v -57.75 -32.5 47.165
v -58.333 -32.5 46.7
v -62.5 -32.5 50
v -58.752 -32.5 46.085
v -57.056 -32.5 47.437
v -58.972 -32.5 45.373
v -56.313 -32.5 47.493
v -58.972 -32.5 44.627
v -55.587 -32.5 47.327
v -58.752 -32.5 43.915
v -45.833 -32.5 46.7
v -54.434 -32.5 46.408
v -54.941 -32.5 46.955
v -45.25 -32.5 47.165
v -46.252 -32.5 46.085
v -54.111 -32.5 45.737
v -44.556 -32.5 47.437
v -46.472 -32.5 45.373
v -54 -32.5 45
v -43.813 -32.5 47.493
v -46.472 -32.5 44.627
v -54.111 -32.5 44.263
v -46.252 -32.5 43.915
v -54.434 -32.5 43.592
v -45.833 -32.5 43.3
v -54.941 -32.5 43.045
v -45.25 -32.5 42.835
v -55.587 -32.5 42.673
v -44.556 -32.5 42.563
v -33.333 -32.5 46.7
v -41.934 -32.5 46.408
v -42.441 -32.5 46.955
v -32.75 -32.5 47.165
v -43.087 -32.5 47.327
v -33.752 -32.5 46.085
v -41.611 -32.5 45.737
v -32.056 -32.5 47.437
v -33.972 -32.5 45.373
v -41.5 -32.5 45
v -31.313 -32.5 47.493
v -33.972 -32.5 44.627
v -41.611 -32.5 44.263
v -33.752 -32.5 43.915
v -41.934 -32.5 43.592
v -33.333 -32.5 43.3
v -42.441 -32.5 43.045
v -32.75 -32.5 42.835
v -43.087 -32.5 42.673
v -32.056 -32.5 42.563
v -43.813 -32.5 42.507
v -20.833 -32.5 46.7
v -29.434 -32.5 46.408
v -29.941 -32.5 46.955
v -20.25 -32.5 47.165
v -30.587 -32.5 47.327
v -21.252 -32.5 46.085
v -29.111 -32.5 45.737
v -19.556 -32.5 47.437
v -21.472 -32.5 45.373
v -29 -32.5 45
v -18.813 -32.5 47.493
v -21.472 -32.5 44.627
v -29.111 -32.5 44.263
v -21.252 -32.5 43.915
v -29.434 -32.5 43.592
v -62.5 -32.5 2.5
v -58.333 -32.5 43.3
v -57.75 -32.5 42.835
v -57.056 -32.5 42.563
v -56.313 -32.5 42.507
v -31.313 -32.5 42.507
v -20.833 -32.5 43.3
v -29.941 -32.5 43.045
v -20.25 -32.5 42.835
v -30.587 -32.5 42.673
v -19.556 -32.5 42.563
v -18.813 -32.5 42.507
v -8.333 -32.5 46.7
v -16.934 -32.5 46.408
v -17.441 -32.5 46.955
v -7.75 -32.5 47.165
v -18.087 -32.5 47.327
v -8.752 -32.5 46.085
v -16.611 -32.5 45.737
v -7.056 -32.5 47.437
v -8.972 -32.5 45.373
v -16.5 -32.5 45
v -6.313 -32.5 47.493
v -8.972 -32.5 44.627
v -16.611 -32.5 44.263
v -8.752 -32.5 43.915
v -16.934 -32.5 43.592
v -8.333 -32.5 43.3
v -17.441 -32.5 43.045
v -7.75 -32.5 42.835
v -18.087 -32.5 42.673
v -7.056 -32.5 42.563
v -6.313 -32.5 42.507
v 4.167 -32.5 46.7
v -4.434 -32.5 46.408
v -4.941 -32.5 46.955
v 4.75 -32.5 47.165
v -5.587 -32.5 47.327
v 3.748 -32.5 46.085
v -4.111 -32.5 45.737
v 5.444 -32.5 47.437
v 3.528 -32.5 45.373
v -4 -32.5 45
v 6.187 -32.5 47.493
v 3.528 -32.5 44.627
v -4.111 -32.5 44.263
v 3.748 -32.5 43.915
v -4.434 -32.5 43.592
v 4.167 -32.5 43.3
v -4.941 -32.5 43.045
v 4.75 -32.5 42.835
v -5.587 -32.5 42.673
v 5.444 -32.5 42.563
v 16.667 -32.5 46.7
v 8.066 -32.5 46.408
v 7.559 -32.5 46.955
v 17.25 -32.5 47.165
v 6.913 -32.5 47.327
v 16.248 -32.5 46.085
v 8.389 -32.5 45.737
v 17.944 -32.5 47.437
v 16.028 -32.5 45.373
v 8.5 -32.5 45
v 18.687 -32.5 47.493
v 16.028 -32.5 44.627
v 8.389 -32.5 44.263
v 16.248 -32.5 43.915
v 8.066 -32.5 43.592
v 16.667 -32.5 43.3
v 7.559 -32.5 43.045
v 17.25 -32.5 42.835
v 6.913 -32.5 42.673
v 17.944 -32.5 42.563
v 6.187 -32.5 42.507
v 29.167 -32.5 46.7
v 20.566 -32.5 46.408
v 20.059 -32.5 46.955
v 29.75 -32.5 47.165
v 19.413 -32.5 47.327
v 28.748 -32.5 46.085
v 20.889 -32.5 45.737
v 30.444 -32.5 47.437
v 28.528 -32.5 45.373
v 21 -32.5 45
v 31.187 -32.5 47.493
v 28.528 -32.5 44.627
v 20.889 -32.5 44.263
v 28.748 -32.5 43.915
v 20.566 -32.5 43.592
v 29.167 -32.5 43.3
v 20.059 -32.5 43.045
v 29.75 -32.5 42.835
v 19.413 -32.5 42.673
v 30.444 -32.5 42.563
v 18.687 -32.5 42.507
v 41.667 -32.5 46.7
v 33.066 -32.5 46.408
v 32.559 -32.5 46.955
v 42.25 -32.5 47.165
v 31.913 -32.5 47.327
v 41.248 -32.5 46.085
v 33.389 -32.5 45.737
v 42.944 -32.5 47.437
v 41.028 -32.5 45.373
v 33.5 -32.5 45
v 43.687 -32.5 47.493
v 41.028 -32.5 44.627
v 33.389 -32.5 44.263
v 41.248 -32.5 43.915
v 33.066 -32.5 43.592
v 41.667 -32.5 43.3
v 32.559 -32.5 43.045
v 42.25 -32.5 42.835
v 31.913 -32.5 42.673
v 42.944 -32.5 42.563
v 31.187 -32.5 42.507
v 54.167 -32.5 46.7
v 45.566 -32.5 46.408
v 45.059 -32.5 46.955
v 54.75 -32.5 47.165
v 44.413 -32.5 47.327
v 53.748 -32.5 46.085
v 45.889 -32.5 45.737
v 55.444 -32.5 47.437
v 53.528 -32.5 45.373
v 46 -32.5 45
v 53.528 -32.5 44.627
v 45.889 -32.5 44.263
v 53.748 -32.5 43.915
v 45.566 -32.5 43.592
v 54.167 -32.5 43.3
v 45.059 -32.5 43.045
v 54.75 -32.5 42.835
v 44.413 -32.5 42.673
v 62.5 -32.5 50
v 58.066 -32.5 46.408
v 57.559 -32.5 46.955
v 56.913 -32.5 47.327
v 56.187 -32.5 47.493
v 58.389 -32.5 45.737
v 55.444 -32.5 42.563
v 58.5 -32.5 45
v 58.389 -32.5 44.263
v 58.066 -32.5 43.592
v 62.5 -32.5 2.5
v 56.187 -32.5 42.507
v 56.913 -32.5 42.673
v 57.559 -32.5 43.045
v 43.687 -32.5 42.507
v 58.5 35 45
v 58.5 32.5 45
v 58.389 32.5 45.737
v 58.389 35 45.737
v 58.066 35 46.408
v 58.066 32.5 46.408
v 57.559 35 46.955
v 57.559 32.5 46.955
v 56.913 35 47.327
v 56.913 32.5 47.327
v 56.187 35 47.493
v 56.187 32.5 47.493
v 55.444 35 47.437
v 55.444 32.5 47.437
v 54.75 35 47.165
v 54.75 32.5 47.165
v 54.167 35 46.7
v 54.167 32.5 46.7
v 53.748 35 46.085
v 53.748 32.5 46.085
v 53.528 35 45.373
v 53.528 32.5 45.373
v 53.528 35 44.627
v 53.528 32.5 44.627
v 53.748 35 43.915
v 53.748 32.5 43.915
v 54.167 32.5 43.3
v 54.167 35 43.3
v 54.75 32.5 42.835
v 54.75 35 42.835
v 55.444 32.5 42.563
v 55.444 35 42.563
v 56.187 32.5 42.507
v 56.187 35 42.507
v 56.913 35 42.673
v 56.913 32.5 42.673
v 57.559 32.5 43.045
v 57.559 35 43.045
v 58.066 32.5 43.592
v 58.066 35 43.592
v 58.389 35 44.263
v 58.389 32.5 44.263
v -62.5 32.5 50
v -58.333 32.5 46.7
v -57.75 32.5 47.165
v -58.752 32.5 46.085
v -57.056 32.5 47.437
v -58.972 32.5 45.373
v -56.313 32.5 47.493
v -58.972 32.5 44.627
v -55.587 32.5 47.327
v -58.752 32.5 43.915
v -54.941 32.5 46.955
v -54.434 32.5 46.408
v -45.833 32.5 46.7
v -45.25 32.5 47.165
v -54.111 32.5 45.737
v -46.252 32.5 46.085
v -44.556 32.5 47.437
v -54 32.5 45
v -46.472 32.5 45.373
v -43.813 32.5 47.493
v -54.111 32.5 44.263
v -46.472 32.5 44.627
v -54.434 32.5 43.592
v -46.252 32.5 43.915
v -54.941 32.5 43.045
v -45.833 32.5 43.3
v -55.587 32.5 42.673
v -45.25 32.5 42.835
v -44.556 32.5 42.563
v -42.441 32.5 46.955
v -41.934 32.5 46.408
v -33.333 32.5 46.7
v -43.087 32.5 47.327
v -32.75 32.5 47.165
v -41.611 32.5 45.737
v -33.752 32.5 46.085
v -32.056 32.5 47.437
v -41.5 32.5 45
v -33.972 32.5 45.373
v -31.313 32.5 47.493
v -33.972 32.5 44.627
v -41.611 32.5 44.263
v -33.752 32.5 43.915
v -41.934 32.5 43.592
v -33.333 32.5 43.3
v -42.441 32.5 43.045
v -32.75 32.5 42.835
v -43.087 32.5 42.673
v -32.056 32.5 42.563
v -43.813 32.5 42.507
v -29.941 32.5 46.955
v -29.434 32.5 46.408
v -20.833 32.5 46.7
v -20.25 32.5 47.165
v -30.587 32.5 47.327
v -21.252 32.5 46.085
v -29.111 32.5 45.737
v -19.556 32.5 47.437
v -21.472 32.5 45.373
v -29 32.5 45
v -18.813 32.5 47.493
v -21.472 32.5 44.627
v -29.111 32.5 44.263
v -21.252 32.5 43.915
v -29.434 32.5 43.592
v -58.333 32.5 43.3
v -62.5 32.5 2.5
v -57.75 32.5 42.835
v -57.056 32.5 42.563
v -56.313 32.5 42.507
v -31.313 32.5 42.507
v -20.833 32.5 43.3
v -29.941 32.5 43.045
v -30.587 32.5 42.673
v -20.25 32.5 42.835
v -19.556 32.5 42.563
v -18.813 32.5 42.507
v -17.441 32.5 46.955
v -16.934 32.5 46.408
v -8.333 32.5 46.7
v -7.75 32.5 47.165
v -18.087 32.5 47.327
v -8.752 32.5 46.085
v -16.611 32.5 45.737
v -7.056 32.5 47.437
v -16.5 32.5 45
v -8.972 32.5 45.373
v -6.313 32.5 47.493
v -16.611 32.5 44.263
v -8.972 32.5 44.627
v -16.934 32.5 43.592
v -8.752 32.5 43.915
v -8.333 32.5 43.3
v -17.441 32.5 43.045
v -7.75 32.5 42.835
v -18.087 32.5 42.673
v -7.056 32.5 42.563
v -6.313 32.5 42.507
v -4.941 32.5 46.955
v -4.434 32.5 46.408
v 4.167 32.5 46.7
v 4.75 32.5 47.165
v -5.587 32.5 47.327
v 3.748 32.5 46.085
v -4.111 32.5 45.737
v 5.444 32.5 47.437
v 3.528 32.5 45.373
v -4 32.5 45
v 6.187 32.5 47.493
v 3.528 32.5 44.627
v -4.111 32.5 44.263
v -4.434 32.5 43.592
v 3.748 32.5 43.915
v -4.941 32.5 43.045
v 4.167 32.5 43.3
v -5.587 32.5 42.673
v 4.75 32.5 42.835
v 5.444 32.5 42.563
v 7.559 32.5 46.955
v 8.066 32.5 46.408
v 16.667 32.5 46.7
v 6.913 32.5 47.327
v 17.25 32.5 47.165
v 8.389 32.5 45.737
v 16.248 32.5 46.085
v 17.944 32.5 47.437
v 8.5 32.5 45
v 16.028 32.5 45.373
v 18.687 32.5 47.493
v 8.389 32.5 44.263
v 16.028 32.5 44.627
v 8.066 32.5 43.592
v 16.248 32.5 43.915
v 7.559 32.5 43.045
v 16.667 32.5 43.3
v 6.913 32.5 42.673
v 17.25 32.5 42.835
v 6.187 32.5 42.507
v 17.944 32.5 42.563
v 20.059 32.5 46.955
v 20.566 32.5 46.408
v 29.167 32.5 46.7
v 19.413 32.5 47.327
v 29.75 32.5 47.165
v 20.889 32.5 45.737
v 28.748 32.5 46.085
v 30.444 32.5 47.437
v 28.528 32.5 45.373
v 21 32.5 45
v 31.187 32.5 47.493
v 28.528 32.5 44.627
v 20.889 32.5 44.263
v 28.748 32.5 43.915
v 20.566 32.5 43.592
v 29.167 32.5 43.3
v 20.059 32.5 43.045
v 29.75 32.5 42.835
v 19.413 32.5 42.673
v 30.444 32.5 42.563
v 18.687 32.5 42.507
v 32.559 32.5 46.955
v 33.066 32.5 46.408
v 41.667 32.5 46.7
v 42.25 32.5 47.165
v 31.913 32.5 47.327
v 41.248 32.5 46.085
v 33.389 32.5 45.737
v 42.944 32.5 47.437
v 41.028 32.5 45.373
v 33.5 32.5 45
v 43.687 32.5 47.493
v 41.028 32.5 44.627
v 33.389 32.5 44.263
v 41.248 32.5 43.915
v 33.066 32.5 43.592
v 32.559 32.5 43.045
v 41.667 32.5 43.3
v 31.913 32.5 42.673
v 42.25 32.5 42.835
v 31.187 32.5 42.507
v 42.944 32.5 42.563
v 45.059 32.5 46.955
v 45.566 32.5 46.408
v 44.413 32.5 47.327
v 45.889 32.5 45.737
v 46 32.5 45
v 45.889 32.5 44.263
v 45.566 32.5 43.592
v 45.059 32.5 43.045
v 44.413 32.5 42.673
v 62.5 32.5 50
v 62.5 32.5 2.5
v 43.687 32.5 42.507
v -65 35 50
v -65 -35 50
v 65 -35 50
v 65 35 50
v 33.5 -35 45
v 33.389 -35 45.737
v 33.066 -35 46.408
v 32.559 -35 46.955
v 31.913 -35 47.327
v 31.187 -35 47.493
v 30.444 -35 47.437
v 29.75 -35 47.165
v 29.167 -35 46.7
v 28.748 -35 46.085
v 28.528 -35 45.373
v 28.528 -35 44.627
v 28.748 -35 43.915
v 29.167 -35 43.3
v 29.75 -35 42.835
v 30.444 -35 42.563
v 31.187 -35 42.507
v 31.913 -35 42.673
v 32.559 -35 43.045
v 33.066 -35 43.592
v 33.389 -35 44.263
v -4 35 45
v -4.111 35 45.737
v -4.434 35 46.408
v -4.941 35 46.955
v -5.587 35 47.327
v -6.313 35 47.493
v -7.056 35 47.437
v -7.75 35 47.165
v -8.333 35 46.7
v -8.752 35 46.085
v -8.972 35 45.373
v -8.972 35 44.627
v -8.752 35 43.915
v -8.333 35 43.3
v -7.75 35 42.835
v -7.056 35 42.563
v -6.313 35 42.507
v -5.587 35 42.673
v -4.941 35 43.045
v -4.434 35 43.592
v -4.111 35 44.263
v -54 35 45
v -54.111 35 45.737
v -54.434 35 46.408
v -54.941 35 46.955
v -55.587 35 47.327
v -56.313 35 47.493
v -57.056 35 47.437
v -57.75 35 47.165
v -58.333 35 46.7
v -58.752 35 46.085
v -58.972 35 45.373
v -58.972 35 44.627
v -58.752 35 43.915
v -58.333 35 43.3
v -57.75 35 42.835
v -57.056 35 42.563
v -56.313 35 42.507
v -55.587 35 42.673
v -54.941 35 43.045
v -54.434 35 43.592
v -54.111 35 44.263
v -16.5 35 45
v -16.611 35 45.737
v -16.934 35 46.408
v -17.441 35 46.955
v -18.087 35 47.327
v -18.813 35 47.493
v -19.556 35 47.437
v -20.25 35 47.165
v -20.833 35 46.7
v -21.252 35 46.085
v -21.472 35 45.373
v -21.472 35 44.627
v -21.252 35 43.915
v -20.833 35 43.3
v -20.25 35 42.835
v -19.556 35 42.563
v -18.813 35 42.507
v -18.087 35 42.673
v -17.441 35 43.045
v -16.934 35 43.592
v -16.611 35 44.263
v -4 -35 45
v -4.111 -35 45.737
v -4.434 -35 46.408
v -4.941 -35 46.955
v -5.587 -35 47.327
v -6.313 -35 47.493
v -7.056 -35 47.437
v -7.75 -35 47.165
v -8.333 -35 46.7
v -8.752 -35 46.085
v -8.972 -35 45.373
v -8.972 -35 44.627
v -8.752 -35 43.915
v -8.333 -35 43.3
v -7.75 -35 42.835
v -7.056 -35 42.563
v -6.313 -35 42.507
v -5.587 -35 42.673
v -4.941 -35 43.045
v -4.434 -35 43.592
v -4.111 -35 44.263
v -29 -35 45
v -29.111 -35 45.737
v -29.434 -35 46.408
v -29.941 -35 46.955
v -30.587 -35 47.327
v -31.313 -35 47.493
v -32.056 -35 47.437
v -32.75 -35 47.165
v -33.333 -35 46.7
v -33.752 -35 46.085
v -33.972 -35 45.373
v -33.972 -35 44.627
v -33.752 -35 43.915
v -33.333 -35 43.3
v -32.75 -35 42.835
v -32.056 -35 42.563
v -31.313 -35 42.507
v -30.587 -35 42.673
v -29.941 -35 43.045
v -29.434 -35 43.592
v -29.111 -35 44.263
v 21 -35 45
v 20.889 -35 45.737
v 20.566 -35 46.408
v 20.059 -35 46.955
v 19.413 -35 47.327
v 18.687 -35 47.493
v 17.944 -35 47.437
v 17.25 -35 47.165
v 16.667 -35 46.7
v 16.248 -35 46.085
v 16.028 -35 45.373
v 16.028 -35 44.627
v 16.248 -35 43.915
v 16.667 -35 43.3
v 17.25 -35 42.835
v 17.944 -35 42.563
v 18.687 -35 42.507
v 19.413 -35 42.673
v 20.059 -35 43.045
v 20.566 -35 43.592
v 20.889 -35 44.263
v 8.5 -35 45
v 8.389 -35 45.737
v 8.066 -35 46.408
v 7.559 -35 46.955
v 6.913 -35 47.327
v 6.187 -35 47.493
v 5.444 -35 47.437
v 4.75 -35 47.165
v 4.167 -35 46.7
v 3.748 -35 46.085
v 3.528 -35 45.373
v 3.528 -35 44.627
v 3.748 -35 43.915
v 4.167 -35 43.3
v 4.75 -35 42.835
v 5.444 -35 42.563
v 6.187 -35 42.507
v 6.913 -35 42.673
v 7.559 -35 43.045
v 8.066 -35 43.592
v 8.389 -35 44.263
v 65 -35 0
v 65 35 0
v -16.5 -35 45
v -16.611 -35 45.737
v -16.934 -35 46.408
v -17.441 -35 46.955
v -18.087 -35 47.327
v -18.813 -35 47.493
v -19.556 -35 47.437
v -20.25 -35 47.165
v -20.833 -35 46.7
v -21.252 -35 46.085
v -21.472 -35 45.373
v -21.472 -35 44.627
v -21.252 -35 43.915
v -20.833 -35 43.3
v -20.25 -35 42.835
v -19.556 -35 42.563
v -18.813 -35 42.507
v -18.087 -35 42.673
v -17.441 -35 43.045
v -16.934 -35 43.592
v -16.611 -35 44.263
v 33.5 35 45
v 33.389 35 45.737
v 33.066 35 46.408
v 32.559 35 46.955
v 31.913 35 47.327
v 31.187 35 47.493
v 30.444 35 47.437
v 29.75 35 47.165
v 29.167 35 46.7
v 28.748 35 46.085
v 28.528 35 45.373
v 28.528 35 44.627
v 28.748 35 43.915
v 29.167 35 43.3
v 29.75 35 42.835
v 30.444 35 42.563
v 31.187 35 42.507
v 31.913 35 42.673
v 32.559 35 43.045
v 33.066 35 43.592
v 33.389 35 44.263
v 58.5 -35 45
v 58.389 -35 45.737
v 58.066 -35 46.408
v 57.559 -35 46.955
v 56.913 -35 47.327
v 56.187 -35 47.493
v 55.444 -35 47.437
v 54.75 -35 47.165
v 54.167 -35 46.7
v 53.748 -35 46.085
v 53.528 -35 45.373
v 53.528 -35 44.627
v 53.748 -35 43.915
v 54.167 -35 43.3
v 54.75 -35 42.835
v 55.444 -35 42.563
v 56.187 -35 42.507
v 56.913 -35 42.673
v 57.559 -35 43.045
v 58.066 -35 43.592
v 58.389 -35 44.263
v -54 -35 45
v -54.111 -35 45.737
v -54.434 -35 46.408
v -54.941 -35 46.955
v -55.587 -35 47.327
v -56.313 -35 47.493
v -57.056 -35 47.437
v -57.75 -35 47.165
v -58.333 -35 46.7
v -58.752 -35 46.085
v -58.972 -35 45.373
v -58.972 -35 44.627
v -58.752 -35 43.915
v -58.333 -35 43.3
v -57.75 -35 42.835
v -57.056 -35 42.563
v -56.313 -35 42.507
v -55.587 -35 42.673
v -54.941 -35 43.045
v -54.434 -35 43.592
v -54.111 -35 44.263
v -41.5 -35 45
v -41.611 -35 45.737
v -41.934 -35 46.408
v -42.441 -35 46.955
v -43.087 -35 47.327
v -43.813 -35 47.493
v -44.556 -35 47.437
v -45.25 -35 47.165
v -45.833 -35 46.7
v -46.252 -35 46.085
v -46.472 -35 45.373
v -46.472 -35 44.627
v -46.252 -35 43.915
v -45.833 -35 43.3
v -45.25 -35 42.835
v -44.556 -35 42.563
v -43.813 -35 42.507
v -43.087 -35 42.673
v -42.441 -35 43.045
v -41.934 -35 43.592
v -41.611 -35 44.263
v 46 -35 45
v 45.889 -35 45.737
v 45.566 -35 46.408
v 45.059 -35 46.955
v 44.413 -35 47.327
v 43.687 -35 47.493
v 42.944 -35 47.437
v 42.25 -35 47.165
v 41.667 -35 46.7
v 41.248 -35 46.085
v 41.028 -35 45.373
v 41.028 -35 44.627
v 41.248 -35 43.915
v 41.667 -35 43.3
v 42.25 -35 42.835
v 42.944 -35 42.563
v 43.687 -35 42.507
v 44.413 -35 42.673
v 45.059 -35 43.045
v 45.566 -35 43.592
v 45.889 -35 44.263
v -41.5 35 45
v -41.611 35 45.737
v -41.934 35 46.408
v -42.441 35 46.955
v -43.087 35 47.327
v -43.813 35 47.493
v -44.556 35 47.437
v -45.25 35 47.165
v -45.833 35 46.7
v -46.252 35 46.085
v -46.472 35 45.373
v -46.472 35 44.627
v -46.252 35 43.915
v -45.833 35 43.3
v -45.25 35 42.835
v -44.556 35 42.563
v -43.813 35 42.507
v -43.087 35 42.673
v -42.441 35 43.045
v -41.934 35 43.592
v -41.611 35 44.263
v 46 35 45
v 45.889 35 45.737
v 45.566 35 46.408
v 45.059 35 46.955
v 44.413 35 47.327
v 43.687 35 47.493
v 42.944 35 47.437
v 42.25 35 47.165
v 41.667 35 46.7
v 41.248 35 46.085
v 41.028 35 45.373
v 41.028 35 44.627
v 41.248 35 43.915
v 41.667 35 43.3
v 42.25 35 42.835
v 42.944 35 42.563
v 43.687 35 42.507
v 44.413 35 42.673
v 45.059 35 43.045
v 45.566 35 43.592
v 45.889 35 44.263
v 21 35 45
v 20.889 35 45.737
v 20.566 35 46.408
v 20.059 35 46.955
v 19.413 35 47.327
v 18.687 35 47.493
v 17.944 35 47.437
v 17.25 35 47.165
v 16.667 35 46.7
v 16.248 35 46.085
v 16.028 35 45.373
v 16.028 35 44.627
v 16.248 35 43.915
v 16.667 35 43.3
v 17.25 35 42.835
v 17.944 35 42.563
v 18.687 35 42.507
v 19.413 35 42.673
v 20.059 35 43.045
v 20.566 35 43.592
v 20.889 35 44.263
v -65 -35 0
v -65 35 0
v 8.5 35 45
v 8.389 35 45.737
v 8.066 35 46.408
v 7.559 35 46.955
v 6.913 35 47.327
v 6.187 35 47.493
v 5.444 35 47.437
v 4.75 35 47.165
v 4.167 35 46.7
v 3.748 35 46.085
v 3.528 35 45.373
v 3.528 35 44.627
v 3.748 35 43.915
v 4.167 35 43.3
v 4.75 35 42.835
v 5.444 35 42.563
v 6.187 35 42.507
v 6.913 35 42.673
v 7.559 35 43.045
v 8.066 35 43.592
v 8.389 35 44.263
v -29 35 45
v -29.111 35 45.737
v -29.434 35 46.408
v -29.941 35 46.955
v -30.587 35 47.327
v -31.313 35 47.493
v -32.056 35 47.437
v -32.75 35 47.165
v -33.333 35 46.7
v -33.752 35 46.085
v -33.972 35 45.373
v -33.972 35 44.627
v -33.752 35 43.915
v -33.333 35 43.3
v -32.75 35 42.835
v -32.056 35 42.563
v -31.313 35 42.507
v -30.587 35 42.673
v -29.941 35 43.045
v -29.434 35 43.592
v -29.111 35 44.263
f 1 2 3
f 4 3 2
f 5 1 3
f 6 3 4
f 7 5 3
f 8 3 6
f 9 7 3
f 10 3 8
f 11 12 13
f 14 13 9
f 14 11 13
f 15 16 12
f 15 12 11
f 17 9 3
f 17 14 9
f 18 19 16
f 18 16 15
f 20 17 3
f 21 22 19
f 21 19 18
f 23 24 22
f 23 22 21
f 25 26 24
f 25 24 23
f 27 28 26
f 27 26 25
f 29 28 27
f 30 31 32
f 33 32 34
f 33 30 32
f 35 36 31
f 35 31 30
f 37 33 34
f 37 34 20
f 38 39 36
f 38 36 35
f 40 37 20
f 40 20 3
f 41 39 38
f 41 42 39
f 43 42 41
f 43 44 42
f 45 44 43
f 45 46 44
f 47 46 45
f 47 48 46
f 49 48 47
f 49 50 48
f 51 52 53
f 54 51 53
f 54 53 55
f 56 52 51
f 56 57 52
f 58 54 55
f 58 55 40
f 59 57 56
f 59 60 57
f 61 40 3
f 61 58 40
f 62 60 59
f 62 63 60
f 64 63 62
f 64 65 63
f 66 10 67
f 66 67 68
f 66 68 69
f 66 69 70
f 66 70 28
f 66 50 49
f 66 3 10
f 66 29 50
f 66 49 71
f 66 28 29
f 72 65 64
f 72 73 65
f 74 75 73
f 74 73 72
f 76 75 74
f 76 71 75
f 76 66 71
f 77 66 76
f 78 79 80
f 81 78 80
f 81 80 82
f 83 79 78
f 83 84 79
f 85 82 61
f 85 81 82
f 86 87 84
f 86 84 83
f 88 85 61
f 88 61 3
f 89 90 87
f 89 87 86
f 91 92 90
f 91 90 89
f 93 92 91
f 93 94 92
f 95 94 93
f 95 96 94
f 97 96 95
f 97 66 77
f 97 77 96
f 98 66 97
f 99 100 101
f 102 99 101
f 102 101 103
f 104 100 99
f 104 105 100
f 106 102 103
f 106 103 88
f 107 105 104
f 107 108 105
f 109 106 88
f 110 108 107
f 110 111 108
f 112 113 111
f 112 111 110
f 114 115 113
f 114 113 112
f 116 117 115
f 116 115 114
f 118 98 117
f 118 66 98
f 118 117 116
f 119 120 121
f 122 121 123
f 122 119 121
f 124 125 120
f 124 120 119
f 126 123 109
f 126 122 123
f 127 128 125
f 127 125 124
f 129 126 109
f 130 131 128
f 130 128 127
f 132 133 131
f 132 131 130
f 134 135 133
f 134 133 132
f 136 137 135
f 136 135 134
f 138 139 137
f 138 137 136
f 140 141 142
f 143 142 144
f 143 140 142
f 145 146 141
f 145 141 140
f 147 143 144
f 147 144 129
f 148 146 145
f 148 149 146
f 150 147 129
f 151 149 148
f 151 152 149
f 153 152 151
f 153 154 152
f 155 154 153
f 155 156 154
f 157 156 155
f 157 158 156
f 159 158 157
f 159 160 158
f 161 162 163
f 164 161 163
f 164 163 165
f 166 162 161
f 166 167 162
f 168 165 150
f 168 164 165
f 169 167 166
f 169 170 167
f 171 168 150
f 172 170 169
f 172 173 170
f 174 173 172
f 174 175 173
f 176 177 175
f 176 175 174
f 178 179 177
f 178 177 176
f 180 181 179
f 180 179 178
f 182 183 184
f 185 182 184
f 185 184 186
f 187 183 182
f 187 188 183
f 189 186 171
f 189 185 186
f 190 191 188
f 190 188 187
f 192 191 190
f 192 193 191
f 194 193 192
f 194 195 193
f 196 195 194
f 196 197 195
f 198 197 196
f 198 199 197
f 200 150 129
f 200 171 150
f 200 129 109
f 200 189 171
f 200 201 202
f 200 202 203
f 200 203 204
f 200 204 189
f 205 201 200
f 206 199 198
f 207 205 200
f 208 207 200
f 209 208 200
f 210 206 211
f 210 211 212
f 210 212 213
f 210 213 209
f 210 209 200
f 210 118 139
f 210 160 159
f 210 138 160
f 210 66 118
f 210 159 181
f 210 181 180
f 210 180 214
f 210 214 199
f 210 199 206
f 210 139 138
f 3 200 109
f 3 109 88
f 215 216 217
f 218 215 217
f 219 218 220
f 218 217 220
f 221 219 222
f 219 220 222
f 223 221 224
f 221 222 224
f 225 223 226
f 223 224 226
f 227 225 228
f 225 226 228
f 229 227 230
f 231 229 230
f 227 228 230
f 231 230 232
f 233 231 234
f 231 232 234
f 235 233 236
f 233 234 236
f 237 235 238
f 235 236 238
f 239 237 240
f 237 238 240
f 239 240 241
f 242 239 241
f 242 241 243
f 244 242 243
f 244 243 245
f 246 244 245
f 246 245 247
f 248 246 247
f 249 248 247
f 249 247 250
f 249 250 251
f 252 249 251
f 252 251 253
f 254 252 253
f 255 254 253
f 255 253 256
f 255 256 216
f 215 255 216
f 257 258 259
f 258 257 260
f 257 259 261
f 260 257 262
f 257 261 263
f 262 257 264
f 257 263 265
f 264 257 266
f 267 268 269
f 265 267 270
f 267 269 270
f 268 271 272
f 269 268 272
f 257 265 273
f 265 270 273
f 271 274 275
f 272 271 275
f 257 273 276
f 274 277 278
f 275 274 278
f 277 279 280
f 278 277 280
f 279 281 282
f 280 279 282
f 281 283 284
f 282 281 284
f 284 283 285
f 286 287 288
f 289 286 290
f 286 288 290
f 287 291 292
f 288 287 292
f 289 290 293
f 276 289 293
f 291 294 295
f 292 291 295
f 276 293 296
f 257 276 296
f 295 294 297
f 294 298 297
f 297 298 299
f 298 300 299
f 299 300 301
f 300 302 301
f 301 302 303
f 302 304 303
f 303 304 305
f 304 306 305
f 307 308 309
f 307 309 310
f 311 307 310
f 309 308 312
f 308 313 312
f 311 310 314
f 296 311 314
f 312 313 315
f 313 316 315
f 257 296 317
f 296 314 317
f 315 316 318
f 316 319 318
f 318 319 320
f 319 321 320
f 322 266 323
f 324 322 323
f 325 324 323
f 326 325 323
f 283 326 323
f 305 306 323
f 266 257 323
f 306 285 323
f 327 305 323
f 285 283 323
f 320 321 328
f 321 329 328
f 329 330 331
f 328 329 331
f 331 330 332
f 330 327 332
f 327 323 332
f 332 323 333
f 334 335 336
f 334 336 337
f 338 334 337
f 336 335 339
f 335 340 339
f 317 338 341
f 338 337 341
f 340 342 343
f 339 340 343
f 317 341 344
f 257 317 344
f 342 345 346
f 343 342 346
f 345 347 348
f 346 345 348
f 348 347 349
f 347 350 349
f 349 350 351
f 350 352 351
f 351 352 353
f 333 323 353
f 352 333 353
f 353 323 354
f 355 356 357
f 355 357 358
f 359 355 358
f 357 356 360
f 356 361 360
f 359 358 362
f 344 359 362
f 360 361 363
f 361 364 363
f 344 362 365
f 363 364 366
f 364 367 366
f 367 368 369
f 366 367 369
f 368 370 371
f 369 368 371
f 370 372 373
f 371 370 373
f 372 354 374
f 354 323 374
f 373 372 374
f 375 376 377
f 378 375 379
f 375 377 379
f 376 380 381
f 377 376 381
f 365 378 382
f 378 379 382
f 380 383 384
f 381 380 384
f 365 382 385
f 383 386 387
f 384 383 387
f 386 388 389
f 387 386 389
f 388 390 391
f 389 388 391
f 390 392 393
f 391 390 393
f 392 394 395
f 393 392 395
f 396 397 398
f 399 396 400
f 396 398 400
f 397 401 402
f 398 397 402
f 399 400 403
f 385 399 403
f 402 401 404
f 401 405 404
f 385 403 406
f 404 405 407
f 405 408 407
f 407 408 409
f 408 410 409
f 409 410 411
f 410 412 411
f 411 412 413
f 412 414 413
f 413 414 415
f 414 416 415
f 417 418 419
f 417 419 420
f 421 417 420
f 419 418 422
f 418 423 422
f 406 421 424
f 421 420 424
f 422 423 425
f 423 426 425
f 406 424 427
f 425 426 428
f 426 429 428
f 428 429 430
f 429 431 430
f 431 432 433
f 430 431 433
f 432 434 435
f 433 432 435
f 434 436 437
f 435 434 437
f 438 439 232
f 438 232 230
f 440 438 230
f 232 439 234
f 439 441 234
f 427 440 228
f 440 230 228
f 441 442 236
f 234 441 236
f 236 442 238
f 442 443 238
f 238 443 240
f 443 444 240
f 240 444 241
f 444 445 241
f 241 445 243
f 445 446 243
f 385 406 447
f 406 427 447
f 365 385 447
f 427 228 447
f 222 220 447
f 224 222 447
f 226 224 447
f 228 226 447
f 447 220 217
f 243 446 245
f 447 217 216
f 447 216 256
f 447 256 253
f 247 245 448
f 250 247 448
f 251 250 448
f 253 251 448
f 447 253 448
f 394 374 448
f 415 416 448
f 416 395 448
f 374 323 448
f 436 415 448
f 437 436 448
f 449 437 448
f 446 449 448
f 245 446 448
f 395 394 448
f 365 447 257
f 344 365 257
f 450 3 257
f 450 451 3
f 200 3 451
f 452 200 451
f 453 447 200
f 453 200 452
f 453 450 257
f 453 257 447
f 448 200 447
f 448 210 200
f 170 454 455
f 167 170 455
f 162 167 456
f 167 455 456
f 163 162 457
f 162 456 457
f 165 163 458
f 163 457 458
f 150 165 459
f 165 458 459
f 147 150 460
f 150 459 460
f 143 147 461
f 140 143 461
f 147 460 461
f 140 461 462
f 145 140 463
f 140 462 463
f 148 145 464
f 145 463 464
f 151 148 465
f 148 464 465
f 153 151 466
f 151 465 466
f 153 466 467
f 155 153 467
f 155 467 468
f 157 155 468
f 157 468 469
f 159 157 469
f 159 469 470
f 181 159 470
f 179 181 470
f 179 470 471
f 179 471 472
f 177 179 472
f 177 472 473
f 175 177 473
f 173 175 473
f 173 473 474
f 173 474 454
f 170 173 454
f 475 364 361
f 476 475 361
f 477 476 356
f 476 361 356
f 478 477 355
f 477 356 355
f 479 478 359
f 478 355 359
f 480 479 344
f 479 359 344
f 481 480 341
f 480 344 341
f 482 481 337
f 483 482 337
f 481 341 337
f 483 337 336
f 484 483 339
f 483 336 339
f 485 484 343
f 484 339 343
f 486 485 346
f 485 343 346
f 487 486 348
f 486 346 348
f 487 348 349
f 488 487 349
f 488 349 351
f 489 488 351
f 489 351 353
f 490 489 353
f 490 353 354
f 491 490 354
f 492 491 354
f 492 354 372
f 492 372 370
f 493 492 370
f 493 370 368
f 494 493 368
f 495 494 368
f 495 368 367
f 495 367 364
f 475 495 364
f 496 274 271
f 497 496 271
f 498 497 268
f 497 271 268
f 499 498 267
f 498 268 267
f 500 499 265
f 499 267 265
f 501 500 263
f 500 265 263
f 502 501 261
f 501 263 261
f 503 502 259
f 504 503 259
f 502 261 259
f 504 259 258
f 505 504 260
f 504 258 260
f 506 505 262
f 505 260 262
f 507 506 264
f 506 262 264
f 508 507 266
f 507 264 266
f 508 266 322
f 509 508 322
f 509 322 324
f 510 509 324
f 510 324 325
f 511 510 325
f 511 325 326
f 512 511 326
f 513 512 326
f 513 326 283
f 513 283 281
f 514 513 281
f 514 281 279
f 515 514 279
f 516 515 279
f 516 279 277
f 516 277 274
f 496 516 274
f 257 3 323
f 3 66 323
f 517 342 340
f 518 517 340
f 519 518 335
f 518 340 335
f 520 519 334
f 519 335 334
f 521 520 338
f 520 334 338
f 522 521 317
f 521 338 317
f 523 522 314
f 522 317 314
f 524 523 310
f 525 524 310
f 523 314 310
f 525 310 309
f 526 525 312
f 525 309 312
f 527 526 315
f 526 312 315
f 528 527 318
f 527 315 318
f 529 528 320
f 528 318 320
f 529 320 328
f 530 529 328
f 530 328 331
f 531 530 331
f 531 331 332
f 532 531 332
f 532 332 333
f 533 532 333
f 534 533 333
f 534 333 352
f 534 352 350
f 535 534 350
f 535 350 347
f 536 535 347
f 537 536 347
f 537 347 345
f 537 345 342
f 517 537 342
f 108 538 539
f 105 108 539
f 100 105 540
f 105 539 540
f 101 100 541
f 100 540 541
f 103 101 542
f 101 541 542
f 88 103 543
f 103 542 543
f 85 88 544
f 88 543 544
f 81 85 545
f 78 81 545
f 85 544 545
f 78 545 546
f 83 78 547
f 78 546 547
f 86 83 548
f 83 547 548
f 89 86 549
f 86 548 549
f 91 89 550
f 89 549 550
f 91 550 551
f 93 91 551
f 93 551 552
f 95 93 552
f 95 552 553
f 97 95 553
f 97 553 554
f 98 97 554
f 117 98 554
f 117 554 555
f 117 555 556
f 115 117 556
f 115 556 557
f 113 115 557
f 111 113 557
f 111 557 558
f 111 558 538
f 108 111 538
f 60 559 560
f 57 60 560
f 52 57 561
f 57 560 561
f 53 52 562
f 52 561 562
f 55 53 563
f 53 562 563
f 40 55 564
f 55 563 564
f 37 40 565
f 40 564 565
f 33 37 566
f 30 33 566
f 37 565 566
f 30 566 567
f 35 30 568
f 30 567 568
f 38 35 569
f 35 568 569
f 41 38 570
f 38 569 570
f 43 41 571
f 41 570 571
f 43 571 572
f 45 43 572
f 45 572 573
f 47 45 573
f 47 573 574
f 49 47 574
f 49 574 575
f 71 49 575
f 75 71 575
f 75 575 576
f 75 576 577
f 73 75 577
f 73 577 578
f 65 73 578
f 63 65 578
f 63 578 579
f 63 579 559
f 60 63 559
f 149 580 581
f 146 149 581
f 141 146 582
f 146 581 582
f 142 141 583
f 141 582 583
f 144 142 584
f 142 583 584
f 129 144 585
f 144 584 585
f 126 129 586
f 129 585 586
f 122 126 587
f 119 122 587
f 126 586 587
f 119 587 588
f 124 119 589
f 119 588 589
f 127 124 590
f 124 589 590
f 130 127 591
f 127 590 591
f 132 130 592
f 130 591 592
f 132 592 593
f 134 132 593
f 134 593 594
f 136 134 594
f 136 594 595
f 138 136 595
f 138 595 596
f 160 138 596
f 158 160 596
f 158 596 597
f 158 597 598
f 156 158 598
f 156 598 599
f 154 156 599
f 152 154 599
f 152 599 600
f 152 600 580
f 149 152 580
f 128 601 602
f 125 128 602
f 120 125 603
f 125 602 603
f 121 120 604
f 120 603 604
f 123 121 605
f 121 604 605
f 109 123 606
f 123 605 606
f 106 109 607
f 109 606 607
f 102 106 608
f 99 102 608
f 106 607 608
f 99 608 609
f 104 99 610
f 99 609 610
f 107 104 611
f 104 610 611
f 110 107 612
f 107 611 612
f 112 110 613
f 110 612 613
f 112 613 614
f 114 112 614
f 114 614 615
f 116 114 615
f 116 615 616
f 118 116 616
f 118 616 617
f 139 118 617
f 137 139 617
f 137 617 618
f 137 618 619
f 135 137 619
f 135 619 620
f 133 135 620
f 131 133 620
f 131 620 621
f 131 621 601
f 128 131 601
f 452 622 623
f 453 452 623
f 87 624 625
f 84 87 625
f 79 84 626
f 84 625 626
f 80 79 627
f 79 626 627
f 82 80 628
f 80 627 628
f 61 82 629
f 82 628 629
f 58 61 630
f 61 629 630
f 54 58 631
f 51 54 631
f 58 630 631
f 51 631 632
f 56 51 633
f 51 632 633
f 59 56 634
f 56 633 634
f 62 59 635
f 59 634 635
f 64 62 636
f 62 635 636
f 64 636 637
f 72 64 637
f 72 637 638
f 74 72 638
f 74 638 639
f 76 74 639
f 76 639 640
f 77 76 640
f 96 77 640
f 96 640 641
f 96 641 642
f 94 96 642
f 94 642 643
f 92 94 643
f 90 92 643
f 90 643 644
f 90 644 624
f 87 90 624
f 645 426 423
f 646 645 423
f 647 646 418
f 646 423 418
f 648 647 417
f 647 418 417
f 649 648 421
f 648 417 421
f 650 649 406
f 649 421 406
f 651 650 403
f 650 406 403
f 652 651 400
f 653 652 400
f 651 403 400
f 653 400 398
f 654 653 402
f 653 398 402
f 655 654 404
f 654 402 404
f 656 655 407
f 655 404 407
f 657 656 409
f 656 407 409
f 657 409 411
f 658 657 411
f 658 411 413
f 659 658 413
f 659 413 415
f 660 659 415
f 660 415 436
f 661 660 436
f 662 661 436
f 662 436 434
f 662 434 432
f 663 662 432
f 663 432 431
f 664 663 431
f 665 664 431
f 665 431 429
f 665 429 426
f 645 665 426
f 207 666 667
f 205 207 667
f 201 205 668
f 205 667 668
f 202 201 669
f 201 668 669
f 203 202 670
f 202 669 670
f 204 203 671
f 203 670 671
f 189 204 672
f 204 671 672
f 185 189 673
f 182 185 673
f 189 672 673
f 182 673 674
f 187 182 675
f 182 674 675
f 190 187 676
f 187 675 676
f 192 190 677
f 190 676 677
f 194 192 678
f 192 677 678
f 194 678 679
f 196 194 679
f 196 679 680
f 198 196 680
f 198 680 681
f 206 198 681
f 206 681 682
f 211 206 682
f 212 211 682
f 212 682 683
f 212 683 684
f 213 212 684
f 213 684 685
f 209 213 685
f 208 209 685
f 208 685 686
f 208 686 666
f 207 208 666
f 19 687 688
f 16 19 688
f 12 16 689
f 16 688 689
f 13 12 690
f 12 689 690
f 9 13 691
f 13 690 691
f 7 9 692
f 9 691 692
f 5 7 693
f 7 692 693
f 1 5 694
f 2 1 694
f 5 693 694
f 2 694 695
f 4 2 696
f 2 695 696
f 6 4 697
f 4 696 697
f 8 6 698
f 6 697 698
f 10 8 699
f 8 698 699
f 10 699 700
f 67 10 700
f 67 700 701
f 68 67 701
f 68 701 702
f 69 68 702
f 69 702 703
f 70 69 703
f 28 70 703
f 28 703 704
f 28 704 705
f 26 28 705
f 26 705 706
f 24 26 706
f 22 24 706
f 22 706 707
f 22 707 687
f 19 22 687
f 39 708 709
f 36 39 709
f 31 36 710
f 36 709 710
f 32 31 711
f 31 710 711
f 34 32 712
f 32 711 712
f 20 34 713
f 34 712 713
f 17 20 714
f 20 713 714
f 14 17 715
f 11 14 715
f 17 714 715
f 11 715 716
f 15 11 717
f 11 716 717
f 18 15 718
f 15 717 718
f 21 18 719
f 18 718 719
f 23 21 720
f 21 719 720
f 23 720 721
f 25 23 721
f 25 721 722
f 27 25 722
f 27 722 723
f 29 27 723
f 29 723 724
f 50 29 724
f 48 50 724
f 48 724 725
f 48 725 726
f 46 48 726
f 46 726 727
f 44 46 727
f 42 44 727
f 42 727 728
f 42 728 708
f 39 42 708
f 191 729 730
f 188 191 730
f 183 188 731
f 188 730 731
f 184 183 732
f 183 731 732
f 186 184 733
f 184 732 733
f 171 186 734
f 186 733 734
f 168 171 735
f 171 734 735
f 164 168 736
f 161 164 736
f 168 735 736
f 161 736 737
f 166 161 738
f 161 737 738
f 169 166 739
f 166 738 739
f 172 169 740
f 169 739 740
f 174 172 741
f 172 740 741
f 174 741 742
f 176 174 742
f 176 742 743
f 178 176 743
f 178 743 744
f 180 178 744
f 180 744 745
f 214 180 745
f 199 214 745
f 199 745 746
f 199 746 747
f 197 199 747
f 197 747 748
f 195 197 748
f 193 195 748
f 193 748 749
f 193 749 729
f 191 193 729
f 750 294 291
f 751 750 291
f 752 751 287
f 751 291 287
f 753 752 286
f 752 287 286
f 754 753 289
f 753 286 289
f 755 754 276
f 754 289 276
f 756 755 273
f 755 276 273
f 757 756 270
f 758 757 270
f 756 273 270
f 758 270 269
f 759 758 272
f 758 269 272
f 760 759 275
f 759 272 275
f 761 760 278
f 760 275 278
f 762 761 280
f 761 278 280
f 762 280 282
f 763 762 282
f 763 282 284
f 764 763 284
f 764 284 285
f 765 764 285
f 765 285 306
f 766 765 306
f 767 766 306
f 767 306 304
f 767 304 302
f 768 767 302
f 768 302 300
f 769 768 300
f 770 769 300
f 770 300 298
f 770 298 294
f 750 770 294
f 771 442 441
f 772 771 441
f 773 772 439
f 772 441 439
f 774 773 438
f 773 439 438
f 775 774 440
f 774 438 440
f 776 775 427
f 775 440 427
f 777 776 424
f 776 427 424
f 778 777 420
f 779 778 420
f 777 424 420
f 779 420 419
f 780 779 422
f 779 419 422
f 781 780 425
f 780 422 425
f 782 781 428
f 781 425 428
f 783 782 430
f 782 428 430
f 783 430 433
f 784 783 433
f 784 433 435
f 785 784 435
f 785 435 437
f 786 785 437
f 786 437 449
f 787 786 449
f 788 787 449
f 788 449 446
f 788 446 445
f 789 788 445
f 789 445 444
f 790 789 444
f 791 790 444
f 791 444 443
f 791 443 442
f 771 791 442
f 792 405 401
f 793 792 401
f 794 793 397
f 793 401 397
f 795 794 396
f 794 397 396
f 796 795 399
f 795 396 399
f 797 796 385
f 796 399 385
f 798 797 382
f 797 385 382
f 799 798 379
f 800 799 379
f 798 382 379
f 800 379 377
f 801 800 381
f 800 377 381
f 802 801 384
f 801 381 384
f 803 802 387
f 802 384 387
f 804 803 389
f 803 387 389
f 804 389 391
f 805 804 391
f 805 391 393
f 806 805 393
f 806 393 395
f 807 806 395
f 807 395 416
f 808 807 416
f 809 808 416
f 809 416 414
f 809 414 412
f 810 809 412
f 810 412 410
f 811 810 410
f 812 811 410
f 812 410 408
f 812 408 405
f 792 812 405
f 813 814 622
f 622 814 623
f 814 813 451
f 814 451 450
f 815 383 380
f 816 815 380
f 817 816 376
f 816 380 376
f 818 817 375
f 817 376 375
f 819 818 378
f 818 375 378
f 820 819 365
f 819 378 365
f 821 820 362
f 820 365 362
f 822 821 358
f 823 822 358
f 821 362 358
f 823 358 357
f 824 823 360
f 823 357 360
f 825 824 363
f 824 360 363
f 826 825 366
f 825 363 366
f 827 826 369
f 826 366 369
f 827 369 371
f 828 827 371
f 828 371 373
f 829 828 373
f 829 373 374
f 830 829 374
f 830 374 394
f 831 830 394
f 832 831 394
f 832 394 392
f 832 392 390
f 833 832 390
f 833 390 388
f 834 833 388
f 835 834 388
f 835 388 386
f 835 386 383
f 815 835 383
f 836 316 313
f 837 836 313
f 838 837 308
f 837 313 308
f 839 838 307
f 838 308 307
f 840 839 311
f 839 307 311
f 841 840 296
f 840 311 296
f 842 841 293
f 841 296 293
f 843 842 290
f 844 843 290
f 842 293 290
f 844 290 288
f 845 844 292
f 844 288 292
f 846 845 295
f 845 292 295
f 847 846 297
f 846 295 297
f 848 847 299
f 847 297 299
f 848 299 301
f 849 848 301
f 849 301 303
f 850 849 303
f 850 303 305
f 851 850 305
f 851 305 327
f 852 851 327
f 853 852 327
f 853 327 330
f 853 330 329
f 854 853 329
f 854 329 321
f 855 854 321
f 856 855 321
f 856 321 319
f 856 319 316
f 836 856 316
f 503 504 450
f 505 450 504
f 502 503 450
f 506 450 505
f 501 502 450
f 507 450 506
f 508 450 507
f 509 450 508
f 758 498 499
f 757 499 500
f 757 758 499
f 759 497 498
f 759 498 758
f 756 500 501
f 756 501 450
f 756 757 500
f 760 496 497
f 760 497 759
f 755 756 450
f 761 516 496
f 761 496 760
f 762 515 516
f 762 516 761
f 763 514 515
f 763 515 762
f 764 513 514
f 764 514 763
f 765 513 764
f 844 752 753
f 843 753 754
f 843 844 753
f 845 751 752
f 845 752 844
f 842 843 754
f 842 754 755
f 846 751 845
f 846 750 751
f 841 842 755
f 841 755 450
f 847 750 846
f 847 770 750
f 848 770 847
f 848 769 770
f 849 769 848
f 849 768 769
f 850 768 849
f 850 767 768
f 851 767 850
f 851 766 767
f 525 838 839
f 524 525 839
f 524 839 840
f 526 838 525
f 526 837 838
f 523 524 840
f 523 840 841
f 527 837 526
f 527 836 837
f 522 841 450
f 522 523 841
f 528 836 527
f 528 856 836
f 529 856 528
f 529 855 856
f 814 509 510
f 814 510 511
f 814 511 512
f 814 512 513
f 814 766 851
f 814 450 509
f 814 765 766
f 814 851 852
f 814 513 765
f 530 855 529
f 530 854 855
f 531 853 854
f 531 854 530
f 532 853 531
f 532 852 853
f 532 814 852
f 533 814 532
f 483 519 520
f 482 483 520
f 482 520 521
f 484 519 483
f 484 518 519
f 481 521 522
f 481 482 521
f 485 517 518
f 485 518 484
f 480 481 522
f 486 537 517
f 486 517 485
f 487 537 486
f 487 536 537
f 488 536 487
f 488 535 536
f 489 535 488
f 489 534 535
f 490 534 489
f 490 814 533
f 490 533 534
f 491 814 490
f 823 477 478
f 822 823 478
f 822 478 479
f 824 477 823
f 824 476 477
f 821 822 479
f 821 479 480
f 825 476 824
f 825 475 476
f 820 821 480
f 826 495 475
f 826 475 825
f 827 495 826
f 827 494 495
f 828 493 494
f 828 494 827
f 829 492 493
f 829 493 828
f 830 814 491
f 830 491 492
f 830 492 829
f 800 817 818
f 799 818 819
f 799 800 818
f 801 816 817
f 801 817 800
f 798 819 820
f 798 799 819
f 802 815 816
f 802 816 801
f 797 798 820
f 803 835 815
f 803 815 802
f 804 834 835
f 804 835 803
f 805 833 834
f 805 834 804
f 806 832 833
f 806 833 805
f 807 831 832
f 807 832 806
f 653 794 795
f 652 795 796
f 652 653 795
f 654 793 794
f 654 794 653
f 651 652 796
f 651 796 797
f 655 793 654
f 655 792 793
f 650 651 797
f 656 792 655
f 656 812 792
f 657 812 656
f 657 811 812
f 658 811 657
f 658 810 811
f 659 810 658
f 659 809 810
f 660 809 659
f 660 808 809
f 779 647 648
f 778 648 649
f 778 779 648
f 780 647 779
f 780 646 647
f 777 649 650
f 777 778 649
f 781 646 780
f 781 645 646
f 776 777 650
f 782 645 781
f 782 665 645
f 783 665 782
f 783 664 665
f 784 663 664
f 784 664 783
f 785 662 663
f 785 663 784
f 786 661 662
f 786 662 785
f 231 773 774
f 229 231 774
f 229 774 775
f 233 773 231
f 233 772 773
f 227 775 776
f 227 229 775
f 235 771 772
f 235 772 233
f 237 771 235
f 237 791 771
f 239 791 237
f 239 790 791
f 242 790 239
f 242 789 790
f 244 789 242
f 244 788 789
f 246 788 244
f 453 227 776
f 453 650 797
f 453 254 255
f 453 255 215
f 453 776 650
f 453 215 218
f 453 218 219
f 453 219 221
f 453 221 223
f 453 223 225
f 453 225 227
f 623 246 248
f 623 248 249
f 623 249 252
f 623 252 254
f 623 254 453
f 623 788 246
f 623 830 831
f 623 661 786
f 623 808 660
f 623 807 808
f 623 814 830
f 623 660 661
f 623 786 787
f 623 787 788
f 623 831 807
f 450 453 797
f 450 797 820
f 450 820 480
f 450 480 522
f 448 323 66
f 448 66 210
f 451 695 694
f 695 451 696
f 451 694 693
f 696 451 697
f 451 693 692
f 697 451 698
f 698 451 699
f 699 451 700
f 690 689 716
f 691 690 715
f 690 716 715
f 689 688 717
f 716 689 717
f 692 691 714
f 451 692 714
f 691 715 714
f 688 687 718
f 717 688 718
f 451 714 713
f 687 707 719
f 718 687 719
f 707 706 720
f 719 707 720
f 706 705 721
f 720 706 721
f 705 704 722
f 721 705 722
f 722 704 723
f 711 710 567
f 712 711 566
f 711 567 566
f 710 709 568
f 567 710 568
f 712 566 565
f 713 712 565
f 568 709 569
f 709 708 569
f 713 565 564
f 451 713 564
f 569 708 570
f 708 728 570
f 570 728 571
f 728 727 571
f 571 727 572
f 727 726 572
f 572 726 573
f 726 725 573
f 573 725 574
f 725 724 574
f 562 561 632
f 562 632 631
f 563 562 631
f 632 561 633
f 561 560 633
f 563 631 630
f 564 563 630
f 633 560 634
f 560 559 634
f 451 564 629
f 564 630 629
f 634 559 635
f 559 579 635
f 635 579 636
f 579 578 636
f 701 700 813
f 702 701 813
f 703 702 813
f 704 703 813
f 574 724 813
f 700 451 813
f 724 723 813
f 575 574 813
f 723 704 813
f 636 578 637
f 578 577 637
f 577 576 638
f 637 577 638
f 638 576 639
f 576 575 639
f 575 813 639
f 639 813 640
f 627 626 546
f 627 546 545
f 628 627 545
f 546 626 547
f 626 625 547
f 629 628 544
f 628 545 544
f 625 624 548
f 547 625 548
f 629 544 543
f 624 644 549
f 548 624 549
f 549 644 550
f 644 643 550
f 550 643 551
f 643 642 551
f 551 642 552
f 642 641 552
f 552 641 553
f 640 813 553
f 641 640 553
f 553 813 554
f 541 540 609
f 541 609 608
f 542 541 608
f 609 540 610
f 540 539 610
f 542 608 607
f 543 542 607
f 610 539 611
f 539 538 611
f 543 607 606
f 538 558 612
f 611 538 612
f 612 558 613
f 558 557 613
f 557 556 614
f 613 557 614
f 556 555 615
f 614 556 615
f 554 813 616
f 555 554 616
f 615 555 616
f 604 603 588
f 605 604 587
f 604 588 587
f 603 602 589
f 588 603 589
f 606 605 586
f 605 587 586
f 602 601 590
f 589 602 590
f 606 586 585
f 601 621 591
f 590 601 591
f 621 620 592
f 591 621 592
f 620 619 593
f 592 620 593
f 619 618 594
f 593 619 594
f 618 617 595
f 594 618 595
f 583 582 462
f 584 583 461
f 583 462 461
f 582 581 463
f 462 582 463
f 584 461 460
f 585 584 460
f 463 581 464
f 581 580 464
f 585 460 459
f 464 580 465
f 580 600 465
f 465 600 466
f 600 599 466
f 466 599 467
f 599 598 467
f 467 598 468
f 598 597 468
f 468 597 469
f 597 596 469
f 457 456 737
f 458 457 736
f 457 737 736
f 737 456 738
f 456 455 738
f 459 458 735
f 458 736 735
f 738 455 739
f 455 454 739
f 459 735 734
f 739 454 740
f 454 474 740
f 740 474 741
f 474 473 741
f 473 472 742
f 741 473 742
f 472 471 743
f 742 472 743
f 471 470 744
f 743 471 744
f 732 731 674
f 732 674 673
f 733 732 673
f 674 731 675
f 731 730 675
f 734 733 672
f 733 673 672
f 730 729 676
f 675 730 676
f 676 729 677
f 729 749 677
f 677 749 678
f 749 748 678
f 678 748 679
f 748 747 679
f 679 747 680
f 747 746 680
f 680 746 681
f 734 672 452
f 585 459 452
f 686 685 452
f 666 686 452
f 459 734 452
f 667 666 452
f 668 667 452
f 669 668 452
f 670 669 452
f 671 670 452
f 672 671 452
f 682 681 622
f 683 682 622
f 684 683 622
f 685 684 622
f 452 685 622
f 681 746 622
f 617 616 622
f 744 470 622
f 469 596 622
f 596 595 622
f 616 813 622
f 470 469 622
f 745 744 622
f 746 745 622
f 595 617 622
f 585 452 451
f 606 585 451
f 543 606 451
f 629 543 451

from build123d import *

# Parameters (mm, degrees)
F0_W     = 130
F0_H     = 70
F1_DEPTH = 50
F2_T     = -2.5
F3_R     = 2.5
F4_DEPTH = 70.001


with BuildPart() as f1:
    # F0 (on Top) → F1 (new body)
    with BuildSketch(Plane.XY):
        Rectangle(F0_W, F0_H)
    extrude(amount=F1_DEPTH)

    # F2
    f2_openings = [f1.faces().sort_by_distance(p)[0] for p in [
        (0, 0, 50),
    ]]
    offset(amount=F2_T, openings=f2_openings)

    # F3 (on face) → F4 (cut, through all)
    with BuildSketch(Plane.XZ.offset(35)):
        with Locations((-56.5, 45)):
            Circle(F3_R)
        with Locations((-44, 45)):
            Circle(F3_R)
        with Locations((-31.5, 45)):
            Circle(F3_R)
        with Locations((-19, 45)):
            Circle(F3_R)
        with Locations((-6.5, 45)):
            Circle(F3_R)
        with Locations((6, 45)):
            Circle(F3_R)
        with Locations((18.5, 45)):
            Circle(F3_R)
        with Locations((31, 45)):
            Circle(F3_R)
        with Locations((43.5, 45)):
            Circle(F3_R)
        with Locations((56, 45)):
            Circle(F3_R)
    extrude(amount=-F4_DEPTH, mode=Mode.SUBTRACT)


solid = f1.part
